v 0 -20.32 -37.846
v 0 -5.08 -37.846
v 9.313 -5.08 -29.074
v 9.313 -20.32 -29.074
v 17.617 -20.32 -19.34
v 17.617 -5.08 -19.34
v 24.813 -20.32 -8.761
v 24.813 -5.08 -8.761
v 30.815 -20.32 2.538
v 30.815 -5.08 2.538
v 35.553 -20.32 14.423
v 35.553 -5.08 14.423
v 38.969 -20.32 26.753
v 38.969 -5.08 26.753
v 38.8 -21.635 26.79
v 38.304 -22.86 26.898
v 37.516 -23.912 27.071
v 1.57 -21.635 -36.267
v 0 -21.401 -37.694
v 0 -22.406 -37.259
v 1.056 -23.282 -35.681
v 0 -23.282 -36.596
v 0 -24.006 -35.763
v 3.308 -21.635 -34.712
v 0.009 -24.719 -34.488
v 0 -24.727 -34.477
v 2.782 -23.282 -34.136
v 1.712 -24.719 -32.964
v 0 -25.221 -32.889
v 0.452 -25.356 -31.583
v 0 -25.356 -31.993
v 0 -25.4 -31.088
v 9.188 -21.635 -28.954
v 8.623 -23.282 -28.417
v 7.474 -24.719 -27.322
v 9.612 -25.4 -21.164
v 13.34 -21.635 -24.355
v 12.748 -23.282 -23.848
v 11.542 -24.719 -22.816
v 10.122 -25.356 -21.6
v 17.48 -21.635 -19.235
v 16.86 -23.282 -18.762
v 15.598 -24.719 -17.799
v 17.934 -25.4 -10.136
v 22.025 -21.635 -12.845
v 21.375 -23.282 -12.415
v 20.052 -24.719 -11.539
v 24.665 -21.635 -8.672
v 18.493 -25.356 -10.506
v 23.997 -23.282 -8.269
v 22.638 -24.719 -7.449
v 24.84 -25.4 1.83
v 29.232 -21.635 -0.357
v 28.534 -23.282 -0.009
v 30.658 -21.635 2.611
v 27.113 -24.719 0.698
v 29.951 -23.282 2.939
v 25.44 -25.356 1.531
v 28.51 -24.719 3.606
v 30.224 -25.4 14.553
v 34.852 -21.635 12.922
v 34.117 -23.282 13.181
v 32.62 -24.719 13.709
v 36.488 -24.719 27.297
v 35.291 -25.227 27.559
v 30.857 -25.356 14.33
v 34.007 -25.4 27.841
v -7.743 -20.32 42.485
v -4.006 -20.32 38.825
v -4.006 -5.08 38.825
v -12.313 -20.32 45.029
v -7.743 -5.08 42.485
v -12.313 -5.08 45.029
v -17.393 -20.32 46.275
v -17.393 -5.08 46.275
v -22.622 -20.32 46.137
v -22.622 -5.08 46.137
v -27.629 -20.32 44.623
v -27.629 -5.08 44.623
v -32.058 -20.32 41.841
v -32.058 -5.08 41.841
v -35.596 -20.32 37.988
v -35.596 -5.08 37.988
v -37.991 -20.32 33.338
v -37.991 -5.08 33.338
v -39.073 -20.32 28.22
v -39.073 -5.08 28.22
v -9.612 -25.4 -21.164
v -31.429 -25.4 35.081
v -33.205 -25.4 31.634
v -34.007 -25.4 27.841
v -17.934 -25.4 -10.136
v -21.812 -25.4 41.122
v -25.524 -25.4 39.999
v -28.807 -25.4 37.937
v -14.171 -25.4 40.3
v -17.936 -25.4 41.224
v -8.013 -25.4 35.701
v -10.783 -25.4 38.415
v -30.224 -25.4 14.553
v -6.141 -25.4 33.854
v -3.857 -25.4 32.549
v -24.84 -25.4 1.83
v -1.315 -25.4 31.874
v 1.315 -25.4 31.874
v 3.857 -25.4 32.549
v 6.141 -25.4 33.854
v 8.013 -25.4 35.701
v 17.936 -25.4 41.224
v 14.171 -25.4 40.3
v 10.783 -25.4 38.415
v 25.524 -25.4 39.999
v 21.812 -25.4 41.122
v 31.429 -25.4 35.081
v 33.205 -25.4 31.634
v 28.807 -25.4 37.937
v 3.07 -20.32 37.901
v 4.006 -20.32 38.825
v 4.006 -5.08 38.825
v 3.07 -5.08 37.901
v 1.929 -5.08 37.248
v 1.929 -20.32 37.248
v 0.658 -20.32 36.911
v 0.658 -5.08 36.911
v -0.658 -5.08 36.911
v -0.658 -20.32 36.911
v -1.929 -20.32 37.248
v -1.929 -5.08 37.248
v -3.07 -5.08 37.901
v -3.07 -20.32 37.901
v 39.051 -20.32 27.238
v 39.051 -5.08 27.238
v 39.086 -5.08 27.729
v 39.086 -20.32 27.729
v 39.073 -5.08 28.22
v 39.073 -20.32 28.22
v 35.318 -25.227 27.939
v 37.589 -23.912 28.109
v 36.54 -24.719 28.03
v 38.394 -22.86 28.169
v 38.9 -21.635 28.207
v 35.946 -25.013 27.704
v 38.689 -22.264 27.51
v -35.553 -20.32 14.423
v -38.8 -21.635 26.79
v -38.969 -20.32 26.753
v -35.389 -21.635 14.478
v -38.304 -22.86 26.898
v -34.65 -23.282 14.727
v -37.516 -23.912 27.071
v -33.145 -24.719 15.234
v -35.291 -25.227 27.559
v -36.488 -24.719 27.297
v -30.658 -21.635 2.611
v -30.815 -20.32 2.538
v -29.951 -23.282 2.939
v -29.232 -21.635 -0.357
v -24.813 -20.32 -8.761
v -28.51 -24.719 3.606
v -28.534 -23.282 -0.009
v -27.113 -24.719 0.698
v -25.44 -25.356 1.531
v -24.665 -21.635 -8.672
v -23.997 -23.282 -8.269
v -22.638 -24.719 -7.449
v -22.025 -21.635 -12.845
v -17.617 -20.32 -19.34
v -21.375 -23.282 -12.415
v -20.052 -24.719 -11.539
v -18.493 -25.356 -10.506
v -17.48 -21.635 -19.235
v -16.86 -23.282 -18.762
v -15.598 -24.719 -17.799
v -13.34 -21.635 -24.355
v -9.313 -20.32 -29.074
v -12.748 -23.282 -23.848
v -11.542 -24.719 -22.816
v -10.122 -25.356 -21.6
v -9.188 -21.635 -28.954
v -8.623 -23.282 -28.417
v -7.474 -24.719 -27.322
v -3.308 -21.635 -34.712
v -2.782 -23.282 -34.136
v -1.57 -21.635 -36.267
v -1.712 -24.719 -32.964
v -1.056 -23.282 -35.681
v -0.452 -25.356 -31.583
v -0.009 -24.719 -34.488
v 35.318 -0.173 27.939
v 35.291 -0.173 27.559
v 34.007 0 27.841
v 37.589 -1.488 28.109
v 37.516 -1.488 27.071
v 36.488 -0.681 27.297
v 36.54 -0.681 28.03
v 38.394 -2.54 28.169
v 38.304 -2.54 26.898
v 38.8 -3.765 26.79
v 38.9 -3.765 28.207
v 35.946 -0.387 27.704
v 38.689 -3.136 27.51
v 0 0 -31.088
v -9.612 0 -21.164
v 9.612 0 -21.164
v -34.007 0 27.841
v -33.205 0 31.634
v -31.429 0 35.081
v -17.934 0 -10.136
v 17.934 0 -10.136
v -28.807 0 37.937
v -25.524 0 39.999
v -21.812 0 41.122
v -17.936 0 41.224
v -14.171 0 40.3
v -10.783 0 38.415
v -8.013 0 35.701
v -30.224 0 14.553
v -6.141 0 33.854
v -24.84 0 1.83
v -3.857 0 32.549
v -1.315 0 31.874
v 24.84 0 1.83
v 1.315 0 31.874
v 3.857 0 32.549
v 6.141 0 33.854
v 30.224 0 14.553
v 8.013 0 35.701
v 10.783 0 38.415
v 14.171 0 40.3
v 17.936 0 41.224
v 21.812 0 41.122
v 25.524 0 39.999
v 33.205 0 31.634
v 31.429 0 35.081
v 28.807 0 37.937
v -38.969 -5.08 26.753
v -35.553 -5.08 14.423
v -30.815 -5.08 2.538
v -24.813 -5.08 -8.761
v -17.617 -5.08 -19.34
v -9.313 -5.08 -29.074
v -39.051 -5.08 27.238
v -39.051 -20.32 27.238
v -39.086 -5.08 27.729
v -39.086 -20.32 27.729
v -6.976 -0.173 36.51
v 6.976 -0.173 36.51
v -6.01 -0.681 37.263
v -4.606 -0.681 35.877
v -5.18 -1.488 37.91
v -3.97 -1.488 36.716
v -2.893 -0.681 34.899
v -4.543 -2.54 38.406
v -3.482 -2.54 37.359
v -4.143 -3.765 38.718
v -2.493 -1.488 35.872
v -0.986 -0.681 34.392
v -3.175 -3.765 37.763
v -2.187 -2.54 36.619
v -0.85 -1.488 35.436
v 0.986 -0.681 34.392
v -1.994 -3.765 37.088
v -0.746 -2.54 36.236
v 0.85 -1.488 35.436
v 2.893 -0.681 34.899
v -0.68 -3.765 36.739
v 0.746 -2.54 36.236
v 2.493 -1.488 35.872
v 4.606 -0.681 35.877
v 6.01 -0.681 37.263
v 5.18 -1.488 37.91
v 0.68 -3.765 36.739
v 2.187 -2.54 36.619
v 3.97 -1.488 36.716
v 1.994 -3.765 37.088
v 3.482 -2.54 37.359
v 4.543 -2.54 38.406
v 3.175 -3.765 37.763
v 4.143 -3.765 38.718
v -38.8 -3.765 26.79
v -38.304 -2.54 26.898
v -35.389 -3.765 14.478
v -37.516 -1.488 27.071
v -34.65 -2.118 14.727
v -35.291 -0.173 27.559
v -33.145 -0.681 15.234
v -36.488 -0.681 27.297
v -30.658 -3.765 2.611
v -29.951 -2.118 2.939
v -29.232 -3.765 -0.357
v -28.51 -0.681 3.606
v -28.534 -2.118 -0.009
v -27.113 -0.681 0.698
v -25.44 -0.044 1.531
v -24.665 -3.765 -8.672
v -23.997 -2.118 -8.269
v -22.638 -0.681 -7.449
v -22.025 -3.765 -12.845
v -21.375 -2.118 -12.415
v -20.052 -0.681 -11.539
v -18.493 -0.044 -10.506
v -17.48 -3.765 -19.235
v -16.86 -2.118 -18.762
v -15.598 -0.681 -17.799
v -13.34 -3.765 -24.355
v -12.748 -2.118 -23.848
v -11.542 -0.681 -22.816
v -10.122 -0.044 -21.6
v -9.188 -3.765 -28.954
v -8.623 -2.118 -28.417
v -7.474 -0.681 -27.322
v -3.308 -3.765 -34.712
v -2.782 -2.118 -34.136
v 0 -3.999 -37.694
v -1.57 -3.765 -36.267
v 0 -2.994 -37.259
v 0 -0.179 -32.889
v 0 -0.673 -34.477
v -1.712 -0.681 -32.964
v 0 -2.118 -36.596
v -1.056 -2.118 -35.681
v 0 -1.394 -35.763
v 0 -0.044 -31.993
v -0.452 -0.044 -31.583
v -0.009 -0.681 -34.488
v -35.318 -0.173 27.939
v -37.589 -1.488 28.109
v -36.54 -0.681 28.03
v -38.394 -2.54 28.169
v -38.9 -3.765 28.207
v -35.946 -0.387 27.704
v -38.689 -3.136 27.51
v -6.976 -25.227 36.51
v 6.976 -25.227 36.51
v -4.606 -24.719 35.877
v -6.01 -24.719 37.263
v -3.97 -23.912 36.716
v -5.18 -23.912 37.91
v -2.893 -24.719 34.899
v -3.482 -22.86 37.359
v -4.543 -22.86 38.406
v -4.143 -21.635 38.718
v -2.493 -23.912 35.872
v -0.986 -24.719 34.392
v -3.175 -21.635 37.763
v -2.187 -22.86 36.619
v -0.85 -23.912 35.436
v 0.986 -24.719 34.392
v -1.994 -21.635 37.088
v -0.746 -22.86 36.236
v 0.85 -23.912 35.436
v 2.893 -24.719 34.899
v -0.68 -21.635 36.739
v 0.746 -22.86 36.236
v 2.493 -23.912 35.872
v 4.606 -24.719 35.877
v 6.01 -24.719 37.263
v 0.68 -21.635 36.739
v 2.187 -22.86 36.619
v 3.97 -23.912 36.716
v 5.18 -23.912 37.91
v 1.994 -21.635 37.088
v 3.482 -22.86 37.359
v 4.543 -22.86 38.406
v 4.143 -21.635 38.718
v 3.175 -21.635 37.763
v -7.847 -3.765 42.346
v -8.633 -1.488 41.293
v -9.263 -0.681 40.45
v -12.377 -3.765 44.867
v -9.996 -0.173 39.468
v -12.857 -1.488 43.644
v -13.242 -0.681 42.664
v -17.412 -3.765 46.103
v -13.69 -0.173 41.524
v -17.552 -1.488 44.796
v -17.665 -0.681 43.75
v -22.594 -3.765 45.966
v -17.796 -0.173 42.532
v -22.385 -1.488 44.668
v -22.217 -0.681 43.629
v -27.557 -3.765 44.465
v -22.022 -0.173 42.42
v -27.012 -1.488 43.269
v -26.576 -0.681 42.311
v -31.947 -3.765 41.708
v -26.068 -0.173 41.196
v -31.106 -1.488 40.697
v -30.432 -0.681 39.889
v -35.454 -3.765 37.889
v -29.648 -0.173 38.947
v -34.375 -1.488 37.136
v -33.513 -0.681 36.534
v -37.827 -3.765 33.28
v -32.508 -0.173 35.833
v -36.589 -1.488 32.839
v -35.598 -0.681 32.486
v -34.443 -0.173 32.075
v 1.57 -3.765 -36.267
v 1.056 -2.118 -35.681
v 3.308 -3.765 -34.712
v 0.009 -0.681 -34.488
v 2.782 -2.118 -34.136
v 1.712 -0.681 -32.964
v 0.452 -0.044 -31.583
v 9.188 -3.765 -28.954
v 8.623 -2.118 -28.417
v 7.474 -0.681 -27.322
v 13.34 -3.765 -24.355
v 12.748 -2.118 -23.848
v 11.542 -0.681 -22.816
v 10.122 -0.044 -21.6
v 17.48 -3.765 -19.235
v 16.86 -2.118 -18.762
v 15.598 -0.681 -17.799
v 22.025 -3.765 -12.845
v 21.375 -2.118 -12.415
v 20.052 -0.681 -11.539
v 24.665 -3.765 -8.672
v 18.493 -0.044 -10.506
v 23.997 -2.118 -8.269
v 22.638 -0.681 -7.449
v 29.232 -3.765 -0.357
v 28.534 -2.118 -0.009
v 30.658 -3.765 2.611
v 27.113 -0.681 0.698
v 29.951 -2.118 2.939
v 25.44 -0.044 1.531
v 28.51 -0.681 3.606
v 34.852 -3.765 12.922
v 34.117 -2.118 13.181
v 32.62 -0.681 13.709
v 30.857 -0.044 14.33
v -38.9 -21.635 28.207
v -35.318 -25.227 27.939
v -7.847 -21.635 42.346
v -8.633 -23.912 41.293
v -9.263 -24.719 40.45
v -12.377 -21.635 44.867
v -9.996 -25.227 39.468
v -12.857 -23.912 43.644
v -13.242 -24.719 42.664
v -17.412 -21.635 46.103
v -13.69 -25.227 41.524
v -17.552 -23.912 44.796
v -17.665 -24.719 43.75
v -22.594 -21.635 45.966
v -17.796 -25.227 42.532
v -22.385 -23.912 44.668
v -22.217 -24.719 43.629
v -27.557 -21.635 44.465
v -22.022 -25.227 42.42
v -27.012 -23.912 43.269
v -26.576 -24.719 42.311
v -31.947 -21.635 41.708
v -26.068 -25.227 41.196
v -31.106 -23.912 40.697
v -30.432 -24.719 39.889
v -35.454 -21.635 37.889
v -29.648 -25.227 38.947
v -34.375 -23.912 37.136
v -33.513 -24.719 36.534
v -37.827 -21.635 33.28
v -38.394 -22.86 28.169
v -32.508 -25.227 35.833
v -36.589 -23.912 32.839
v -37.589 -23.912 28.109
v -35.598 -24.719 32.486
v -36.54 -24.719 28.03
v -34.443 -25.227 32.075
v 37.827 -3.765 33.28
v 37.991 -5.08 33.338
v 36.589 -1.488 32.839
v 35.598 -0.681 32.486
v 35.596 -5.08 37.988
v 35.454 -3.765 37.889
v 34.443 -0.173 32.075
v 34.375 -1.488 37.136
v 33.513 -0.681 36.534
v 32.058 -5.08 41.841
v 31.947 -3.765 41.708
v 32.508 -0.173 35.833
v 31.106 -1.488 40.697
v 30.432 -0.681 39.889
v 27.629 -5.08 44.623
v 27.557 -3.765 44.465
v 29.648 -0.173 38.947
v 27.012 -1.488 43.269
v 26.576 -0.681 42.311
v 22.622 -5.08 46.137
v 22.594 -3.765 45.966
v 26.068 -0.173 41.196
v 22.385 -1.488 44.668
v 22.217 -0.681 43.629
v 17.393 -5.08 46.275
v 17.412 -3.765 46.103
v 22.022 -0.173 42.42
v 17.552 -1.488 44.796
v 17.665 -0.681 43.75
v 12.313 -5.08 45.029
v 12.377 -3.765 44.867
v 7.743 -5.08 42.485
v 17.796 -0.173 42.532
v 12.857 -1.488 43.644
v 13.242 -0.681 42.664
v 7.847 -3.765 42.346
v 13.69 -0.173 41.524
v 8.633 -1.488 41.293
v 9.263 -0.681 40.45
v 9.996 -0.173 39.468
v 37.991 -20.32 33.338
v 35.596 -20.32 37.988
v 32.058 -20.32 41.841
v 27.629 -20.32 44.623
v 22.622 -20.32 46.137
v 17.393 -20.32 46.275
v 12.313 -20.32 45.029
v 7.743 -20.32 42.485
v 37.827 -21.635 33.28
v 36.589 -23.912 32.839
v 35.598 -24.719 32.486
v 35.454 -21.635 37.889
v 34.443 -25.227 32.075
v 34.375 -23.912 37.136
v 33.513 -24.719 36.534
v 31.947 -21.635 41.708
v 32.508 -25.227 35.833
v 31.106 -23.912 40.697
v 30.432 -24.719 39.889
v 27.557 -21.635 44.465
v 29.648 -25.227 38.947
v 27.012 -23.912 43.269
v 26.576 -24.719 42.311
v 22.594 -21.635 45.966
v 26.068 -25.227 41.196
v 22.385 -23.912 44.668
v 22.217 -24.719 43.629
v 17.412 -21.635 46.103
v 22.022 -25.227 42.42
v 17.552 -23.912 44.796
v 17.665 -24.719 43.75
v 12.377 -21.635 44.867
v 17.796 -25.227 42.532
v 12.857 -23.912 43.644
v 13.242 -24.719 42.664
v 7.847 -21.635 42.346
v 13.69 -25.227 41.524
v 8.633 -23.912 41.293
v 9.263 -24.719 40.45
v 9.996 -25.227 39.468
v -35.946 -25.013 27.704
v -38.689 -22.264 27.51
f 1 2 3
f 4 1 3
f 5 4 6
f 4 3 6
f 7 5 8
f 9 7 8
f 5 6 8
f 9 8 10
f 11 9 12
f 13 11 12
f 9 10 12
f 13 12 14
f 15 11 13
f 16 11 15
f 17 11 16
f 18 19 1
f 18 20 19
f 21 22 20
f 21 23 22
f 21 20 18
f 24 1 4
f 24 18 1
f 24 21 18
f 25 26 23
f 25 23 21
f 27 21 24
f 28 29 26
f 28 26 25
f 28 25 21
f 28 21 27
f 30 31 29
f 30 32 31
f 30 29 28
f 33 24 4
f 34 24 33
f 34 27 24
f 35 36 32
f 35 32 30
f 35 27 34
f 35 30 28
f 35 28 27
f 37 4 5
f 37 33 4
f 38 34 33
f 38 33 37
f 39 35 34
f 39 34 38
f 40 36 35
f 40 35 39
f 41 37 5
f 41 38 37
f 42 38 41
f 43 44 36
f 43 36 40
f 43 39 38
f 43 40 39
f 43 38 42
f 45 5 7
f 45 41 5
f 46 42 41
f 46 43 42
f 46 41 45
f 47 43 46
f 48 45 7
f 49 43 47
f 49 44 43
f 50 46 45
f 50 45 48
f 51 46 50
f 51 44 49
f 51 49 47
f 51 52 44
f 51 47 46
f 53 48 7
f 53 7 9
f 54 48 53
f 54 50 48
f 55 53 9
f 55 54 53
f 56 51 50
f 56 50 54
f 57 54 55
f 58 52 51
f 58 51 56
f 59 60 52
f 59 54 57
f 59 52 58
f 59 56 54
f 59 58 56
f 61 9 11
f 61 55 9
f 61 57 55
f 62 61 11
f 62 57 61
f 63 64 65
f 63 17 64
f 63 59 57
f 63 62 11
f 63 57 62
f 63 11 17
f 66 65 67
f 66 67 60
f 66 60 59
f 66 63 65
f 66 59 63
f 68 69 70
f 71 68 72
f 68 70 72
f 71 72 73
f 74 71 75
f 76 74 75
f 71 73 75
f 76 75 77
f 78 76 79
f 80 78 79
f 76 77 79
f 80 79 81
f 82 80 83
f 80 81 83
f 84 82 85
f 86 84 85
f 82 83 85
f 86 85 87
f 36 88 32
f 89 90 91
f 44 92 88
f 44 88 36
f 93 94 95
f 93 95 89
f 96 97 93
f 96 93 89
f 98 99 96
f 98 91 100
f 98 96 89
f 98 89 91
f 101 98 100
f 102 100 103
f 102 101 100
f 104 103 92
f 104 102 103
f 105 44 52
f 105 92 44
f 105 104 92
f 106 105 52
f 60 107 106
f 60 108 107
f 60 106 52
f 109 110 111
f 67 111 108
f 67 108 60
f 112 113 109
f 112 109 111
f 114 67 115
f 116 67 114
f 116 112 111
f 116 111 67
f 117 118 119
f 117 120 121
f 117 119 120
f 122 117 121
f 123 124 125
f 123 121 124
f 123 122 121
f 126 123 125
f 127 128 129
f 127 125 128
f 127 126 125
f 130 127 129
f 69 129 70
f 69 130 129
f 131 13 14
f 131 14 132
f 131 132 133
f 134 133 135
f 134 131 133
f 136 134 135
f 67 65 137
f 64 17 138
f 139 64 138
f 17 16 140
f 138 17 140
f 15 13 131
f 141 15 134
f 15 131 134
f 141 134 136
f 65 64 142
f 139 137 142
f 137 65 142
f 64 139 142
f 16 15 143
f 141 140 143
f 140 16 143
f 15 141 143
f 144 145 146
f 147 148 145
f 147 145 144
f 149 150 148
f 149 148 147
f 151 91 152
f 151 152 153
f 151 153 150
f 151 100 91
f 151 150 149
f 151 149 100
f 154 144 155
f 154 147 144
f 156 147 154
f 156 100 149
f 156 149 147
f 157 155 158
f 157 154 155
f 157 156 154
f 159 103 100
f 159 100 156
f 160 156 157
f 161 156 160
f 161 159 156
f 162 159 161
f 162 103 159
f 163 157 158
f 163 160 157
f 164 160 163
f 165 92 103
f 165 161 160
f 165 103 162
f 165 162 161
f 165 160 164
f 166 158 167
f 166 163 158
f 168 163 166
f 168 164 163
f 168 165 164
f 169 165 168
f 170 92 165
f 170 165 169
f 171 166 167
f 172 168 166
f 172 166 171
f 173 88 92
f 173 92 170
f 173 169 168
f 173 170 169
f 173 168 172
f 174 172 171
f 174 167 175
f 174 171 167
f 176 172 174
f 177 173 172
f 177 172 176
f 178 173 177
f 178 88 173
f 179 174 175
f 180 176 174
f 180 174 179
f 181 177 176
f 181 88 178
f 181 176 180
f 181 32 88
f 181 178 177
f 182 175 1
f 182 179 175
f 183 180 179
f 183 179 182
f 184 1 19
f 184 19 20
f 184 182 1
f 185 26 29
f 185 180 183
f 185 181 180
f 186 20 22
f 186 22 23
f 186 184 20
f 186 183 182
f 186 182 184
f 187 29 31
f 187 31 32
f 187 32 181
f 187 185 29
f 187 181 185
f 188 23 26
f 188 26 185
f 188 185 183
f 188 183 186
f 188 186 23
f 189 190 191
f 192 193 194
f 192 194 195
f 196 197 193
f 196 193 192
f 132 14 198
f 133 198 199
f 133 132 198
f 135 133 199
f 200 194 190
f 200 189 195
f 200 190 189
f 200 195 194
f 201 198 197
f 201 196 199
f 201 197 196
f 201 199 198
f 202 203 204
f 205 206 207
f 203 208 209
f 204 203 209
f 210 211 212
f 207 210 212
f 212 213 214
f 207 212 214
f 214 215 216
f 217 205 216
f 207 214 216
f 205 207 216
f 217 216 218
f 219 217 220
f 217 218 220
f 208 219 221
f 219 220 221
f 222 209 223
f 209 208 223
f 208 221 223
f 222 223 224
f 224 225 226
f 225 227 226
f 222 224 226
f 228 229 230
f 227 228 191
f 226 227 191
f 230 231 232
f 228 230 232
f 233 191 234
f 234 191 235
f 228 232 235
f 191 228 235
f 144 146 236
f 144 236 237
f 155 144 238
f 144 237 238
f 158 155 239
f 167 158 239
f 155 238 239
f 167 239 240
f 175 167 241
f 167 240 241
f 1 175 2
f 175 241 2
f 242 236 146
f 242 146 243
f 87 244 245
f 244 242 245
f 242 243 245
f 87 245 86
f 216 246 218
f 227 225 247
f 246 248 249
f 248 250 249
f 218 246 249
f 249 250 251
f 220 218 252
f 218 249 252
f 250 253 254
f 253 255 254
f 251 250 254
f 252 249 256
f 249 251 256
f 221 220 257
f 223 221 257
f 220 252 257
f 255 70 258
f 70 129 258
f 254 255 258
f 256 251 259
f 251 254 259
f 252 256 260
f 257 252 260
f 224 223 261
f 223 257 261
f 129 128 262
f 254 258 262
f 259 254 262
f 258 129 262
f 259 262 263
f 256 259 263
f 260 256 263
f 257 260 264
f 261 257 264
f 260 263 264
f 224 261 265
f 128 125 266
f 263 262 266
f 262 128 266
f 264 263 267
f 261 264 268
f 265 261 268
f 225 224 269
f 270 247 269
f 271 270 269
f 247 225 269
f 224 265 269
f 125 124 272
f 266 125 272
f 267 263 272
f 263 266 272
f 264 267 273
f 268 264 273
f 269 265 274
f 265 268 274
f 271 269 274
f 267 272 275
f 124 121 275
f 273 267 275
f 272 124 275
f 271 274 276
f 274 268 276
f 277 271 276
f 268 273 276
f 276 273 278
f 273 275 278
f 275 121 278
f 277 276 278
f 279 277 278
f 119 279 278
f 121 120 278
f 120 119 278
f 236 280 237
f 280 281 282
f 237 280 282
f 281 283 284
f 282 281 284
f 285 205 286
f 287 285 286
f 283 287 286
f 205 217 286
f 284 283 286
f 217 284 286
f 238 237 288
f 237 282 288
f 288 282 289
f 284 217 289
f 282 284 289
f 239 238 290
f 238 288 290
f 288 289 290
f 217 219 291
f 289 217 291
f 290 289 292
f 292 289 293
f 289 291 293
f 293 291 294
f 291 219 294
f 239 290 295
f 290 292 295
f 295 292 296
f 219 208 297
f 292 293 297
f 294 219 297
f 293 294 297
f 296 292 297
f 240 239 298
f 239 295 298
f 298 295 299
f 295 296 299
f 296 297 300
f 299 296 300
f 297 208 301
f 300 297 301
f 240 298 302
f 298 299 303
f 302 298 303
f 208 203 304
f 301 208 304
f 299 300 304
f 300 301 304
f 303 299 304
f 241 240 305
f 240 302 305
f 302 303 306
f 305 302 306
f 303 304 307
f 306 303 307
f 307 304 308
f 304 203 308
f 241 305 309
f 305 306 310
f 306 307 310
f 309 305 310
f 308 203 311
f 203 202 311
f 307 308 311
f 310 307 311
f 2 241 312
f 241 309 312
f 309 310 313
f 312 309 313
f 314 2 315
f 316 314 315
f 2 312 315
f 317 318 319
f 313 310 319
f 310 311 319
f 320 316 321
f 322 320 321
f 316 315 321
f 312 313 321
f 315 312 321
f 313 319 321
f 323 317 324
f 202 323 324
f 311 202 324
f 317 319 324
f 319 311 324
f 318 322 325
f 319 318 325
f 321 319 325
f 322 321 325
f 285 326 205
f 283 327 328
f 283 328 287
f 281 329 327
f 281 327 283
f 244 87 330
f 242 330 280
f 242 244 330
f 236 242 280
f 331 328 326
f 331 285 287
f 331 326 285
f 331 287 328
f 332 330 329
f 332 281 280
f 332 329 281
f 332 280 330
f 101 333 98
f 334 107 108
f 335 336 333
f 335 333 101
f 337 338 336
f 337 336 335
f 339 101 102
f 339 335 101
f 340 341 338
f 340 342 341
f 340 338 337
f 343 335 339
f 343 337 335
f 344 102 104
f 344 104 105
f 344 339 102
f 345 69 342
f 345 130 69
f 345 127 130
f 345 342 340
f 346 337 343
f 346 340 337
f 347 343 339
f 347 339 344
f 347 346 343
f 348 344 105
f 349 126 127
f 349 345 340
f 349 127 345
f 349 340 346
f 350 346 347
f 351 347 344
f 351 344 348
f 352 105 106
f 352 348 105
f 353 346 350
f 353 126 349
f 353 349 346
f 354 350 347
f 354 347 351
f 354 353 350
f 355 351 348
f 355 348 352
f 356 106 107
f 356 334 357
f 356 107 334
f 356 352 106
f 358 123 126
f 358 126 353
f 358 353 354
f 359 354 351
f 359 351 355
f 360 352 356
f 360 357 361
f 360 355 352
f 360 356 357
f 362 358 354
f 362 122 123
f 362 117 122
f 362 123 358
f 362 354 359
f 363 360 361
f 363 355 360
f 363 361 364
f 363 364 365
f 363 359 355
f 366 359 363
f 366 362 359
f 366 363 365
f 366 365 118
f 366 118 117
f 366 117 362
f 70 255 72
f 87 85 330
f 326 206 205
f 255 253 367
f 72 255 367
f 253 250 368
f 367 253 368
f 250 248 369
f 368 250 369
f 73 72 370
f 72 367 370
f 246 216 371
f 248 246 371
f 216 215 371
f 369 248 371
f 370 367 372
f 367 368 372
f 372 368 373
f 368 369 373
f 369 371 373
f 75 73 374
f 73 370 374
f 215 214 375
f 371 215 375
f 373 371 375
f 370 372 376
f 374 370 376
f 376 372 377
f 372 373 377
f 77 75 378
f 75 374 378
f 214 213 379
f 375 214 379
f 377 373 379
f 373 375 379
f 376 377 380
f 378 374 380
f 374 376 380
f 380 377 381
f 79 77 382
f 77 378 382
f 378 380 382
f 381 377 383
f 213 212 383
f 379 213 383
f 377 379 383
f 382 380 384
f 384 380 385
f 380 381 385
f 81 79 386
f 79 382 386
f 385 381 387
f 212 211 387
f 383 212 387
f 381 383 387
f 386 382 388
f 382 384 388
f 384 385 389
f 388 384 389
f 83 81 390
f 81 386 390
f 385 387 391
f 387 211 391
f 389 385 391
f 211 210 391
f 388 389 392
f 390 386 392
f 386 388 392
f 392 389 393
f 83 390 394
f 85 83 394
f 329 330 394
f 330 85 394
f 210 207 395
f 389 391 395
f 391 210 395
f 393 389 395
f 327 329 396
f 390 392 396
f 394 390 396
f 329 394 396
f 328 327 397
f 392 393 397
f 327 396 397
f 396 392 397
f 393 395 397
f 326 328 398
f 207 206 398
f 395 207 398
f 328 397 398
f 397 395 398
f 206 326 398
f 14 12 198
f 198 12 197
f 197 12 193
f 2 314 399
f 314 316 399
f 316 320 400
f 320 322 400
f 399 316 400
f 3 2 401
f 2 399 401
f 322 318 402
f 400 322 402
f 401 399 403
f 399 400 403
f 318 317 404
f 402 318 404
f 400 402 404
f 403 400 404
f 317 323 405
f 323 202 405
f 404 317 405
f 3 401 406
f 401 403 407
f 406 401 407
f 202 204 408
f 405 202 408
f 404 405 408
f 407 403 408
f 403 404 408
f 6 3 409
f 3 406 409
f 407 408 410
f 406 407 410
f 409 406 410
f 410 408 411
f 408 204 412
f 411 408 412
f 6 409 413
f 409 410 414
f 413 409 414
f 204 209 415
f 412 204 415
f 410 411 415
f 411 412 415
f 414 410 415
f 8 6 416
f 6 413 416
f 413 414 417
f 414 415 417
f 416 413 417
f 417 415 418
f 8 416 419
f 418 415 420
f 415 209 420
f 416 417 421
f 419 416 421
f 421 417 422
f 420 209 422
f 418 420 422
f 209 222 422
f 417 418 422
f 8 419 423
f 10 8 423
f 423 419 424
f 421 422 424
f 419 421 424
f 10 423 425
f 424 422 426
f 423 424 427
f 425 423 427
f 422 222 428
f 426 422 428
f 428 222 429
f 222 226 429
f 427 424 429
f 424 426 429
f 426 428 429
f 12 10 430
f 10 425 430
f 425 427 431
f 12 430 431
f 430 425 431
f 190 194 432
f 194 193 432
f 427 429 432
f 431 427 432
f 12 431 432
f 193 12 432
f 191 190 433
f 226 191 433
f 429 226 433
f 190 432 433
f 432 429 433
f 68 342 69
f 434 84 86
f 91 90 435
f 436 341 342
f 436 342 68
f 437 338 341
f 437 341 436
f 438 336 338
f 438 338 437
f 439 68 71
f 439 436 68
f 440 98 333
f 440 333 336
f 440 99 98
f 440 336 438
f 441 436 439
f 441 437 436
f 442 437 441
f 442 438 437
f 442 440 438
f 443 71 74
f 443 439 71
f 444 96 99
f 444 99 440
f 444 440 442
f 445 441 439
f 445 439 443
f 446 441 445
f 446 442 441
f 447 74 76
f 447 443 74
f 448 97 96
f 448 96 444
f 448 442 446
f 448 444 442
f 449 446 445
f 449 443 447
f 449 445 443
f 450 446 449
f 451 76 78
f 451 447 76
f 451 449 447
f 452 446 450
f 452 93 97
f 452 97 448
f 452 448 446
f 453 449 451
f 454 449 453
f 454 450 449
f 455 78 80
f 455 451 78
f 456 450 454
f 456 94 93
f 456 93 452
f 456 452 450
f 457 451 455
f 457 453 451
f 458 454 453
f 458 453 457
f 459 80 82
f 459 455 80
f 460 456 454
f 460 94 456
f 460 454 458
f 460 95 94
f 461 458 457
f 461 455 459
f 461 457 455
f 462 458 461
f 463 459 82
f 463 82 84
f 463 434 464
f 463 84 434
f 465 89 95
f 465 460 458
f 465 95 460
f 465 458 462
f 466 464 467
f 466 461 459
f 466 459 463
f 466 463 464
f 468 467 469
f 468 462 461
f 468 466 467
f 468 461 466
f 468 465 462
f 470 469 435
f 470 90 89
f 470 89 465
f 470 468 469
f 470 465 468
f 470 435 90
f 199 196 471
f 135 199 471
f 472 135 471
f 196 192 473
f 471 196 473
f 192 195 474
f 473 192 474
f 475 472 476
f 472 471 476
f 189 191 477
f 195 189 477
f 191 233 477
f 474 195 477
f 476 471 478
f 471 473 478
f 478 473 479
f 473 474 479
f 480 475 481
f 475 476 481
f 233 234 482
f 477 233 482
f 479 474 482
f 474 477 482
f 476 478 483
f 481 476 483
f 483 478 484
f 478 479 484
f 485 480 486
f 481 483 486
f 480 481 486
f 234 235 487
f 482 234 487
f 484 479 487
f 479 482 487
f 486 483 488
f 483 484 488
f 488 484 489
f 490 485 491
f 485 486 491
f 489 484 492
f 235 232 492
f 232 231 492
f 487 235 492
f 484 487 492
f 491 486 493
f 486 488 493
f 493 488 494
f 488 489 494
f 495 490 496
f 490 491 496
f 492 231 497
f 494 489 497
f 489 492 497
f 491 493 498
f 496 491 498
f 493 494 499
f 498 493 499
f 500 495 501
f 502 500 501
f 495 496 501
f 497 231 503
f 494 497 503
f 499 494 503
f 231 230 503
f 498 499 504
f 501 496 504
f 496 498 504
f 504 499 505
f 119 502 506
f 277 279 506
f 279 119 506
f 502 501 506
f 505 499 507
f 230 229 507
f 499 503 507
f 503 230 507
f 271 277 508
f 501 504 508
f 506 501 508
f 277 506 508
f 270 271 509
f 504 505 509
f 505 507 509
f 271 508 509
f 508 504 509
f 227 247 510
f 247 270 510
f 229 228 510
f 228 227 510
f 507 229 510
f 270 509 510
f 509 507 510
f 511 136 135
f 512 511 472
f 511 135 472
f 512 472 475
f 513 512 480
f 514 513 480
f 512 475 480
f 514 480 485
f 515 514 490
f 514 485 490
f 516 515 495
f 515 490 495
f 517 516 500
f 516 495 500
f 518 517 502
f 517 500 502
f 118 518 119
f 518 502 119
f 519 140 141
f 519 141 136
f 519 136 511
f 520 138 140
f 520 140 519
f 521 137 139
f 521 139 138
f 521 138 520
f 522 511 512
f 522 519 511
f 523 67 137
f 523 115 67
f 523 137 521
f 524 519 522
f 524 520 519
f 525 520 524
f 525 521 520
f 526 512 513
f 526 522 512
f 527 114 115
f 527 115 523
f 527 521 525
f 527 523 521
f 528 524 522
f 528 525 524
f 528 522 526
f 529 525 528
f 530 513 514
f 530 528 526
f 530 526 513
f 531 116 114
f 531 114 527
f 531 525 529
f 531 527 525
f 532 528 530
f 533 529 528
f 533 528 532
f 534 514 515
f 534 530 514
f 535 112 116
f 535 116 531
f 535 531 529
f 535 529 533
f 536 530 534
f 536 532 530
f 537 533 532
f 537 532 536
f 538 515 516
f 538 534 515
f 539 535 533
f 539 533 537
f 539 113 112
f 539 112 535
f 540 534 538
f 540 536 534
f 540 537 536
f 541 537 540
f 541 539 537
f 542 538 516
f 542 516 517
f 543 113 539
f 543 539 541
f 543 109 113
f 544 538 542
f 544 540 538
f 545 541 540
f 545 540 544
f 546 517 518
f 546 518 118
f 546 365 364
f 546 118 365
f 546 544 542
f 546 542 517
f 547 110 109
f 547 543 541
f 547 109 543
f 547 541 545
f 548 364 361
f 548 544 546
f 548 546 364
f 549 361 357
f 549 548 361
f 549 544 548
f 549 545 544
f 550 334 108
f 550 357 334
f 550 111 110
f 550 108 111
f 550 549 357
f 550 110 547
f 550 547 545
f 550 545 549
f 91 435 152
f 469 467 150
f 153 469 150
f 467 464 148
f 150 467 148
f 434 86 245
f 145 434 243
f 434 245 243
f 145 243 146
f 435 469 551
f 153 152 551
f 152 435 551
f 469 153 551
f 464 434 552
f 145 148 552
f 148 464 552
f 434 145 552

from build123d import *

# Parameters (mm, degrees)
F1_DEPTH = 25.4
F3_R     = 5.08


# Not quite as in the source:
# - a feature of the source that left no trace in its solid (it failed there, or was rolled back) is left out


with BuildPart() as f1:
    # F0 (on Front) → F1 (new body)
    with BuildSketch(Plane.XZ):
        with BuildLine():
            ThreePointArc((39.115998894, 27.4320002645), (20.3391036575, 46.3696241803), (0, 29.1206747426))
            ThreePointArc((0, 29.1206747426), (-20.3391036575, 46.3696241803), (-39.115998894, 27.4320002645))
            ThreePointArc((-39.115998894, 27.4320002645), (-24.9919364346, -8.4631327613), (0, -37.8459990025))
            ThreePointArc((0, -37.8459990025), (24.9919364346, -8.4631327613), (39.115998894, 27.4320002645))
        make_face()
        with BuildLine():
            ThreePointArc((0, 29.1206747426), (0.1433513735, 26.7523380063), (0, 24.3840012699))
            ThreePointArc((0, 24.3840012699), (-0.1433513735, 26.7523380063), (0, 29.1206747426))
        make_face(mode=Mode.SUBTRACT)
        with BuildLine():
            ThreePointArc((0, 29.1206747426), (-0.1433513735, 26.7523380063), (0, 24.3840012699))
            ThreePointArc((0, 24.3840012699), (0.1433513735, 26.7523380063), (0, 29.1206747426))
        make_face()
    extrude(amount=F1_DEPTH)

    # F3
    f3_edges = [f1.edges().sort_by_distance(p)[0] for p in [
        (20.339104, 0, 46.369624),
        (20.339104, -25.4, 46.369624),
        (0, -12.7, 29.120675),
        (-39.115999, -12.7, 27.432),
        (-20.339104, 0, 46.369624),
        (-20.339104, -25.4, 46.369624),
        (39.115999, -12.7, 27.432),
        (-24.991936, 0, -8.463133),
        (-24.991936, -25.4, -8.463133),
        (24.991936, 0, -8.463133),
        (24.991936, -25.4, -8.463133),
    ]]
    fillet(f3_edges, radius=F3_R)


solid = f1.part
